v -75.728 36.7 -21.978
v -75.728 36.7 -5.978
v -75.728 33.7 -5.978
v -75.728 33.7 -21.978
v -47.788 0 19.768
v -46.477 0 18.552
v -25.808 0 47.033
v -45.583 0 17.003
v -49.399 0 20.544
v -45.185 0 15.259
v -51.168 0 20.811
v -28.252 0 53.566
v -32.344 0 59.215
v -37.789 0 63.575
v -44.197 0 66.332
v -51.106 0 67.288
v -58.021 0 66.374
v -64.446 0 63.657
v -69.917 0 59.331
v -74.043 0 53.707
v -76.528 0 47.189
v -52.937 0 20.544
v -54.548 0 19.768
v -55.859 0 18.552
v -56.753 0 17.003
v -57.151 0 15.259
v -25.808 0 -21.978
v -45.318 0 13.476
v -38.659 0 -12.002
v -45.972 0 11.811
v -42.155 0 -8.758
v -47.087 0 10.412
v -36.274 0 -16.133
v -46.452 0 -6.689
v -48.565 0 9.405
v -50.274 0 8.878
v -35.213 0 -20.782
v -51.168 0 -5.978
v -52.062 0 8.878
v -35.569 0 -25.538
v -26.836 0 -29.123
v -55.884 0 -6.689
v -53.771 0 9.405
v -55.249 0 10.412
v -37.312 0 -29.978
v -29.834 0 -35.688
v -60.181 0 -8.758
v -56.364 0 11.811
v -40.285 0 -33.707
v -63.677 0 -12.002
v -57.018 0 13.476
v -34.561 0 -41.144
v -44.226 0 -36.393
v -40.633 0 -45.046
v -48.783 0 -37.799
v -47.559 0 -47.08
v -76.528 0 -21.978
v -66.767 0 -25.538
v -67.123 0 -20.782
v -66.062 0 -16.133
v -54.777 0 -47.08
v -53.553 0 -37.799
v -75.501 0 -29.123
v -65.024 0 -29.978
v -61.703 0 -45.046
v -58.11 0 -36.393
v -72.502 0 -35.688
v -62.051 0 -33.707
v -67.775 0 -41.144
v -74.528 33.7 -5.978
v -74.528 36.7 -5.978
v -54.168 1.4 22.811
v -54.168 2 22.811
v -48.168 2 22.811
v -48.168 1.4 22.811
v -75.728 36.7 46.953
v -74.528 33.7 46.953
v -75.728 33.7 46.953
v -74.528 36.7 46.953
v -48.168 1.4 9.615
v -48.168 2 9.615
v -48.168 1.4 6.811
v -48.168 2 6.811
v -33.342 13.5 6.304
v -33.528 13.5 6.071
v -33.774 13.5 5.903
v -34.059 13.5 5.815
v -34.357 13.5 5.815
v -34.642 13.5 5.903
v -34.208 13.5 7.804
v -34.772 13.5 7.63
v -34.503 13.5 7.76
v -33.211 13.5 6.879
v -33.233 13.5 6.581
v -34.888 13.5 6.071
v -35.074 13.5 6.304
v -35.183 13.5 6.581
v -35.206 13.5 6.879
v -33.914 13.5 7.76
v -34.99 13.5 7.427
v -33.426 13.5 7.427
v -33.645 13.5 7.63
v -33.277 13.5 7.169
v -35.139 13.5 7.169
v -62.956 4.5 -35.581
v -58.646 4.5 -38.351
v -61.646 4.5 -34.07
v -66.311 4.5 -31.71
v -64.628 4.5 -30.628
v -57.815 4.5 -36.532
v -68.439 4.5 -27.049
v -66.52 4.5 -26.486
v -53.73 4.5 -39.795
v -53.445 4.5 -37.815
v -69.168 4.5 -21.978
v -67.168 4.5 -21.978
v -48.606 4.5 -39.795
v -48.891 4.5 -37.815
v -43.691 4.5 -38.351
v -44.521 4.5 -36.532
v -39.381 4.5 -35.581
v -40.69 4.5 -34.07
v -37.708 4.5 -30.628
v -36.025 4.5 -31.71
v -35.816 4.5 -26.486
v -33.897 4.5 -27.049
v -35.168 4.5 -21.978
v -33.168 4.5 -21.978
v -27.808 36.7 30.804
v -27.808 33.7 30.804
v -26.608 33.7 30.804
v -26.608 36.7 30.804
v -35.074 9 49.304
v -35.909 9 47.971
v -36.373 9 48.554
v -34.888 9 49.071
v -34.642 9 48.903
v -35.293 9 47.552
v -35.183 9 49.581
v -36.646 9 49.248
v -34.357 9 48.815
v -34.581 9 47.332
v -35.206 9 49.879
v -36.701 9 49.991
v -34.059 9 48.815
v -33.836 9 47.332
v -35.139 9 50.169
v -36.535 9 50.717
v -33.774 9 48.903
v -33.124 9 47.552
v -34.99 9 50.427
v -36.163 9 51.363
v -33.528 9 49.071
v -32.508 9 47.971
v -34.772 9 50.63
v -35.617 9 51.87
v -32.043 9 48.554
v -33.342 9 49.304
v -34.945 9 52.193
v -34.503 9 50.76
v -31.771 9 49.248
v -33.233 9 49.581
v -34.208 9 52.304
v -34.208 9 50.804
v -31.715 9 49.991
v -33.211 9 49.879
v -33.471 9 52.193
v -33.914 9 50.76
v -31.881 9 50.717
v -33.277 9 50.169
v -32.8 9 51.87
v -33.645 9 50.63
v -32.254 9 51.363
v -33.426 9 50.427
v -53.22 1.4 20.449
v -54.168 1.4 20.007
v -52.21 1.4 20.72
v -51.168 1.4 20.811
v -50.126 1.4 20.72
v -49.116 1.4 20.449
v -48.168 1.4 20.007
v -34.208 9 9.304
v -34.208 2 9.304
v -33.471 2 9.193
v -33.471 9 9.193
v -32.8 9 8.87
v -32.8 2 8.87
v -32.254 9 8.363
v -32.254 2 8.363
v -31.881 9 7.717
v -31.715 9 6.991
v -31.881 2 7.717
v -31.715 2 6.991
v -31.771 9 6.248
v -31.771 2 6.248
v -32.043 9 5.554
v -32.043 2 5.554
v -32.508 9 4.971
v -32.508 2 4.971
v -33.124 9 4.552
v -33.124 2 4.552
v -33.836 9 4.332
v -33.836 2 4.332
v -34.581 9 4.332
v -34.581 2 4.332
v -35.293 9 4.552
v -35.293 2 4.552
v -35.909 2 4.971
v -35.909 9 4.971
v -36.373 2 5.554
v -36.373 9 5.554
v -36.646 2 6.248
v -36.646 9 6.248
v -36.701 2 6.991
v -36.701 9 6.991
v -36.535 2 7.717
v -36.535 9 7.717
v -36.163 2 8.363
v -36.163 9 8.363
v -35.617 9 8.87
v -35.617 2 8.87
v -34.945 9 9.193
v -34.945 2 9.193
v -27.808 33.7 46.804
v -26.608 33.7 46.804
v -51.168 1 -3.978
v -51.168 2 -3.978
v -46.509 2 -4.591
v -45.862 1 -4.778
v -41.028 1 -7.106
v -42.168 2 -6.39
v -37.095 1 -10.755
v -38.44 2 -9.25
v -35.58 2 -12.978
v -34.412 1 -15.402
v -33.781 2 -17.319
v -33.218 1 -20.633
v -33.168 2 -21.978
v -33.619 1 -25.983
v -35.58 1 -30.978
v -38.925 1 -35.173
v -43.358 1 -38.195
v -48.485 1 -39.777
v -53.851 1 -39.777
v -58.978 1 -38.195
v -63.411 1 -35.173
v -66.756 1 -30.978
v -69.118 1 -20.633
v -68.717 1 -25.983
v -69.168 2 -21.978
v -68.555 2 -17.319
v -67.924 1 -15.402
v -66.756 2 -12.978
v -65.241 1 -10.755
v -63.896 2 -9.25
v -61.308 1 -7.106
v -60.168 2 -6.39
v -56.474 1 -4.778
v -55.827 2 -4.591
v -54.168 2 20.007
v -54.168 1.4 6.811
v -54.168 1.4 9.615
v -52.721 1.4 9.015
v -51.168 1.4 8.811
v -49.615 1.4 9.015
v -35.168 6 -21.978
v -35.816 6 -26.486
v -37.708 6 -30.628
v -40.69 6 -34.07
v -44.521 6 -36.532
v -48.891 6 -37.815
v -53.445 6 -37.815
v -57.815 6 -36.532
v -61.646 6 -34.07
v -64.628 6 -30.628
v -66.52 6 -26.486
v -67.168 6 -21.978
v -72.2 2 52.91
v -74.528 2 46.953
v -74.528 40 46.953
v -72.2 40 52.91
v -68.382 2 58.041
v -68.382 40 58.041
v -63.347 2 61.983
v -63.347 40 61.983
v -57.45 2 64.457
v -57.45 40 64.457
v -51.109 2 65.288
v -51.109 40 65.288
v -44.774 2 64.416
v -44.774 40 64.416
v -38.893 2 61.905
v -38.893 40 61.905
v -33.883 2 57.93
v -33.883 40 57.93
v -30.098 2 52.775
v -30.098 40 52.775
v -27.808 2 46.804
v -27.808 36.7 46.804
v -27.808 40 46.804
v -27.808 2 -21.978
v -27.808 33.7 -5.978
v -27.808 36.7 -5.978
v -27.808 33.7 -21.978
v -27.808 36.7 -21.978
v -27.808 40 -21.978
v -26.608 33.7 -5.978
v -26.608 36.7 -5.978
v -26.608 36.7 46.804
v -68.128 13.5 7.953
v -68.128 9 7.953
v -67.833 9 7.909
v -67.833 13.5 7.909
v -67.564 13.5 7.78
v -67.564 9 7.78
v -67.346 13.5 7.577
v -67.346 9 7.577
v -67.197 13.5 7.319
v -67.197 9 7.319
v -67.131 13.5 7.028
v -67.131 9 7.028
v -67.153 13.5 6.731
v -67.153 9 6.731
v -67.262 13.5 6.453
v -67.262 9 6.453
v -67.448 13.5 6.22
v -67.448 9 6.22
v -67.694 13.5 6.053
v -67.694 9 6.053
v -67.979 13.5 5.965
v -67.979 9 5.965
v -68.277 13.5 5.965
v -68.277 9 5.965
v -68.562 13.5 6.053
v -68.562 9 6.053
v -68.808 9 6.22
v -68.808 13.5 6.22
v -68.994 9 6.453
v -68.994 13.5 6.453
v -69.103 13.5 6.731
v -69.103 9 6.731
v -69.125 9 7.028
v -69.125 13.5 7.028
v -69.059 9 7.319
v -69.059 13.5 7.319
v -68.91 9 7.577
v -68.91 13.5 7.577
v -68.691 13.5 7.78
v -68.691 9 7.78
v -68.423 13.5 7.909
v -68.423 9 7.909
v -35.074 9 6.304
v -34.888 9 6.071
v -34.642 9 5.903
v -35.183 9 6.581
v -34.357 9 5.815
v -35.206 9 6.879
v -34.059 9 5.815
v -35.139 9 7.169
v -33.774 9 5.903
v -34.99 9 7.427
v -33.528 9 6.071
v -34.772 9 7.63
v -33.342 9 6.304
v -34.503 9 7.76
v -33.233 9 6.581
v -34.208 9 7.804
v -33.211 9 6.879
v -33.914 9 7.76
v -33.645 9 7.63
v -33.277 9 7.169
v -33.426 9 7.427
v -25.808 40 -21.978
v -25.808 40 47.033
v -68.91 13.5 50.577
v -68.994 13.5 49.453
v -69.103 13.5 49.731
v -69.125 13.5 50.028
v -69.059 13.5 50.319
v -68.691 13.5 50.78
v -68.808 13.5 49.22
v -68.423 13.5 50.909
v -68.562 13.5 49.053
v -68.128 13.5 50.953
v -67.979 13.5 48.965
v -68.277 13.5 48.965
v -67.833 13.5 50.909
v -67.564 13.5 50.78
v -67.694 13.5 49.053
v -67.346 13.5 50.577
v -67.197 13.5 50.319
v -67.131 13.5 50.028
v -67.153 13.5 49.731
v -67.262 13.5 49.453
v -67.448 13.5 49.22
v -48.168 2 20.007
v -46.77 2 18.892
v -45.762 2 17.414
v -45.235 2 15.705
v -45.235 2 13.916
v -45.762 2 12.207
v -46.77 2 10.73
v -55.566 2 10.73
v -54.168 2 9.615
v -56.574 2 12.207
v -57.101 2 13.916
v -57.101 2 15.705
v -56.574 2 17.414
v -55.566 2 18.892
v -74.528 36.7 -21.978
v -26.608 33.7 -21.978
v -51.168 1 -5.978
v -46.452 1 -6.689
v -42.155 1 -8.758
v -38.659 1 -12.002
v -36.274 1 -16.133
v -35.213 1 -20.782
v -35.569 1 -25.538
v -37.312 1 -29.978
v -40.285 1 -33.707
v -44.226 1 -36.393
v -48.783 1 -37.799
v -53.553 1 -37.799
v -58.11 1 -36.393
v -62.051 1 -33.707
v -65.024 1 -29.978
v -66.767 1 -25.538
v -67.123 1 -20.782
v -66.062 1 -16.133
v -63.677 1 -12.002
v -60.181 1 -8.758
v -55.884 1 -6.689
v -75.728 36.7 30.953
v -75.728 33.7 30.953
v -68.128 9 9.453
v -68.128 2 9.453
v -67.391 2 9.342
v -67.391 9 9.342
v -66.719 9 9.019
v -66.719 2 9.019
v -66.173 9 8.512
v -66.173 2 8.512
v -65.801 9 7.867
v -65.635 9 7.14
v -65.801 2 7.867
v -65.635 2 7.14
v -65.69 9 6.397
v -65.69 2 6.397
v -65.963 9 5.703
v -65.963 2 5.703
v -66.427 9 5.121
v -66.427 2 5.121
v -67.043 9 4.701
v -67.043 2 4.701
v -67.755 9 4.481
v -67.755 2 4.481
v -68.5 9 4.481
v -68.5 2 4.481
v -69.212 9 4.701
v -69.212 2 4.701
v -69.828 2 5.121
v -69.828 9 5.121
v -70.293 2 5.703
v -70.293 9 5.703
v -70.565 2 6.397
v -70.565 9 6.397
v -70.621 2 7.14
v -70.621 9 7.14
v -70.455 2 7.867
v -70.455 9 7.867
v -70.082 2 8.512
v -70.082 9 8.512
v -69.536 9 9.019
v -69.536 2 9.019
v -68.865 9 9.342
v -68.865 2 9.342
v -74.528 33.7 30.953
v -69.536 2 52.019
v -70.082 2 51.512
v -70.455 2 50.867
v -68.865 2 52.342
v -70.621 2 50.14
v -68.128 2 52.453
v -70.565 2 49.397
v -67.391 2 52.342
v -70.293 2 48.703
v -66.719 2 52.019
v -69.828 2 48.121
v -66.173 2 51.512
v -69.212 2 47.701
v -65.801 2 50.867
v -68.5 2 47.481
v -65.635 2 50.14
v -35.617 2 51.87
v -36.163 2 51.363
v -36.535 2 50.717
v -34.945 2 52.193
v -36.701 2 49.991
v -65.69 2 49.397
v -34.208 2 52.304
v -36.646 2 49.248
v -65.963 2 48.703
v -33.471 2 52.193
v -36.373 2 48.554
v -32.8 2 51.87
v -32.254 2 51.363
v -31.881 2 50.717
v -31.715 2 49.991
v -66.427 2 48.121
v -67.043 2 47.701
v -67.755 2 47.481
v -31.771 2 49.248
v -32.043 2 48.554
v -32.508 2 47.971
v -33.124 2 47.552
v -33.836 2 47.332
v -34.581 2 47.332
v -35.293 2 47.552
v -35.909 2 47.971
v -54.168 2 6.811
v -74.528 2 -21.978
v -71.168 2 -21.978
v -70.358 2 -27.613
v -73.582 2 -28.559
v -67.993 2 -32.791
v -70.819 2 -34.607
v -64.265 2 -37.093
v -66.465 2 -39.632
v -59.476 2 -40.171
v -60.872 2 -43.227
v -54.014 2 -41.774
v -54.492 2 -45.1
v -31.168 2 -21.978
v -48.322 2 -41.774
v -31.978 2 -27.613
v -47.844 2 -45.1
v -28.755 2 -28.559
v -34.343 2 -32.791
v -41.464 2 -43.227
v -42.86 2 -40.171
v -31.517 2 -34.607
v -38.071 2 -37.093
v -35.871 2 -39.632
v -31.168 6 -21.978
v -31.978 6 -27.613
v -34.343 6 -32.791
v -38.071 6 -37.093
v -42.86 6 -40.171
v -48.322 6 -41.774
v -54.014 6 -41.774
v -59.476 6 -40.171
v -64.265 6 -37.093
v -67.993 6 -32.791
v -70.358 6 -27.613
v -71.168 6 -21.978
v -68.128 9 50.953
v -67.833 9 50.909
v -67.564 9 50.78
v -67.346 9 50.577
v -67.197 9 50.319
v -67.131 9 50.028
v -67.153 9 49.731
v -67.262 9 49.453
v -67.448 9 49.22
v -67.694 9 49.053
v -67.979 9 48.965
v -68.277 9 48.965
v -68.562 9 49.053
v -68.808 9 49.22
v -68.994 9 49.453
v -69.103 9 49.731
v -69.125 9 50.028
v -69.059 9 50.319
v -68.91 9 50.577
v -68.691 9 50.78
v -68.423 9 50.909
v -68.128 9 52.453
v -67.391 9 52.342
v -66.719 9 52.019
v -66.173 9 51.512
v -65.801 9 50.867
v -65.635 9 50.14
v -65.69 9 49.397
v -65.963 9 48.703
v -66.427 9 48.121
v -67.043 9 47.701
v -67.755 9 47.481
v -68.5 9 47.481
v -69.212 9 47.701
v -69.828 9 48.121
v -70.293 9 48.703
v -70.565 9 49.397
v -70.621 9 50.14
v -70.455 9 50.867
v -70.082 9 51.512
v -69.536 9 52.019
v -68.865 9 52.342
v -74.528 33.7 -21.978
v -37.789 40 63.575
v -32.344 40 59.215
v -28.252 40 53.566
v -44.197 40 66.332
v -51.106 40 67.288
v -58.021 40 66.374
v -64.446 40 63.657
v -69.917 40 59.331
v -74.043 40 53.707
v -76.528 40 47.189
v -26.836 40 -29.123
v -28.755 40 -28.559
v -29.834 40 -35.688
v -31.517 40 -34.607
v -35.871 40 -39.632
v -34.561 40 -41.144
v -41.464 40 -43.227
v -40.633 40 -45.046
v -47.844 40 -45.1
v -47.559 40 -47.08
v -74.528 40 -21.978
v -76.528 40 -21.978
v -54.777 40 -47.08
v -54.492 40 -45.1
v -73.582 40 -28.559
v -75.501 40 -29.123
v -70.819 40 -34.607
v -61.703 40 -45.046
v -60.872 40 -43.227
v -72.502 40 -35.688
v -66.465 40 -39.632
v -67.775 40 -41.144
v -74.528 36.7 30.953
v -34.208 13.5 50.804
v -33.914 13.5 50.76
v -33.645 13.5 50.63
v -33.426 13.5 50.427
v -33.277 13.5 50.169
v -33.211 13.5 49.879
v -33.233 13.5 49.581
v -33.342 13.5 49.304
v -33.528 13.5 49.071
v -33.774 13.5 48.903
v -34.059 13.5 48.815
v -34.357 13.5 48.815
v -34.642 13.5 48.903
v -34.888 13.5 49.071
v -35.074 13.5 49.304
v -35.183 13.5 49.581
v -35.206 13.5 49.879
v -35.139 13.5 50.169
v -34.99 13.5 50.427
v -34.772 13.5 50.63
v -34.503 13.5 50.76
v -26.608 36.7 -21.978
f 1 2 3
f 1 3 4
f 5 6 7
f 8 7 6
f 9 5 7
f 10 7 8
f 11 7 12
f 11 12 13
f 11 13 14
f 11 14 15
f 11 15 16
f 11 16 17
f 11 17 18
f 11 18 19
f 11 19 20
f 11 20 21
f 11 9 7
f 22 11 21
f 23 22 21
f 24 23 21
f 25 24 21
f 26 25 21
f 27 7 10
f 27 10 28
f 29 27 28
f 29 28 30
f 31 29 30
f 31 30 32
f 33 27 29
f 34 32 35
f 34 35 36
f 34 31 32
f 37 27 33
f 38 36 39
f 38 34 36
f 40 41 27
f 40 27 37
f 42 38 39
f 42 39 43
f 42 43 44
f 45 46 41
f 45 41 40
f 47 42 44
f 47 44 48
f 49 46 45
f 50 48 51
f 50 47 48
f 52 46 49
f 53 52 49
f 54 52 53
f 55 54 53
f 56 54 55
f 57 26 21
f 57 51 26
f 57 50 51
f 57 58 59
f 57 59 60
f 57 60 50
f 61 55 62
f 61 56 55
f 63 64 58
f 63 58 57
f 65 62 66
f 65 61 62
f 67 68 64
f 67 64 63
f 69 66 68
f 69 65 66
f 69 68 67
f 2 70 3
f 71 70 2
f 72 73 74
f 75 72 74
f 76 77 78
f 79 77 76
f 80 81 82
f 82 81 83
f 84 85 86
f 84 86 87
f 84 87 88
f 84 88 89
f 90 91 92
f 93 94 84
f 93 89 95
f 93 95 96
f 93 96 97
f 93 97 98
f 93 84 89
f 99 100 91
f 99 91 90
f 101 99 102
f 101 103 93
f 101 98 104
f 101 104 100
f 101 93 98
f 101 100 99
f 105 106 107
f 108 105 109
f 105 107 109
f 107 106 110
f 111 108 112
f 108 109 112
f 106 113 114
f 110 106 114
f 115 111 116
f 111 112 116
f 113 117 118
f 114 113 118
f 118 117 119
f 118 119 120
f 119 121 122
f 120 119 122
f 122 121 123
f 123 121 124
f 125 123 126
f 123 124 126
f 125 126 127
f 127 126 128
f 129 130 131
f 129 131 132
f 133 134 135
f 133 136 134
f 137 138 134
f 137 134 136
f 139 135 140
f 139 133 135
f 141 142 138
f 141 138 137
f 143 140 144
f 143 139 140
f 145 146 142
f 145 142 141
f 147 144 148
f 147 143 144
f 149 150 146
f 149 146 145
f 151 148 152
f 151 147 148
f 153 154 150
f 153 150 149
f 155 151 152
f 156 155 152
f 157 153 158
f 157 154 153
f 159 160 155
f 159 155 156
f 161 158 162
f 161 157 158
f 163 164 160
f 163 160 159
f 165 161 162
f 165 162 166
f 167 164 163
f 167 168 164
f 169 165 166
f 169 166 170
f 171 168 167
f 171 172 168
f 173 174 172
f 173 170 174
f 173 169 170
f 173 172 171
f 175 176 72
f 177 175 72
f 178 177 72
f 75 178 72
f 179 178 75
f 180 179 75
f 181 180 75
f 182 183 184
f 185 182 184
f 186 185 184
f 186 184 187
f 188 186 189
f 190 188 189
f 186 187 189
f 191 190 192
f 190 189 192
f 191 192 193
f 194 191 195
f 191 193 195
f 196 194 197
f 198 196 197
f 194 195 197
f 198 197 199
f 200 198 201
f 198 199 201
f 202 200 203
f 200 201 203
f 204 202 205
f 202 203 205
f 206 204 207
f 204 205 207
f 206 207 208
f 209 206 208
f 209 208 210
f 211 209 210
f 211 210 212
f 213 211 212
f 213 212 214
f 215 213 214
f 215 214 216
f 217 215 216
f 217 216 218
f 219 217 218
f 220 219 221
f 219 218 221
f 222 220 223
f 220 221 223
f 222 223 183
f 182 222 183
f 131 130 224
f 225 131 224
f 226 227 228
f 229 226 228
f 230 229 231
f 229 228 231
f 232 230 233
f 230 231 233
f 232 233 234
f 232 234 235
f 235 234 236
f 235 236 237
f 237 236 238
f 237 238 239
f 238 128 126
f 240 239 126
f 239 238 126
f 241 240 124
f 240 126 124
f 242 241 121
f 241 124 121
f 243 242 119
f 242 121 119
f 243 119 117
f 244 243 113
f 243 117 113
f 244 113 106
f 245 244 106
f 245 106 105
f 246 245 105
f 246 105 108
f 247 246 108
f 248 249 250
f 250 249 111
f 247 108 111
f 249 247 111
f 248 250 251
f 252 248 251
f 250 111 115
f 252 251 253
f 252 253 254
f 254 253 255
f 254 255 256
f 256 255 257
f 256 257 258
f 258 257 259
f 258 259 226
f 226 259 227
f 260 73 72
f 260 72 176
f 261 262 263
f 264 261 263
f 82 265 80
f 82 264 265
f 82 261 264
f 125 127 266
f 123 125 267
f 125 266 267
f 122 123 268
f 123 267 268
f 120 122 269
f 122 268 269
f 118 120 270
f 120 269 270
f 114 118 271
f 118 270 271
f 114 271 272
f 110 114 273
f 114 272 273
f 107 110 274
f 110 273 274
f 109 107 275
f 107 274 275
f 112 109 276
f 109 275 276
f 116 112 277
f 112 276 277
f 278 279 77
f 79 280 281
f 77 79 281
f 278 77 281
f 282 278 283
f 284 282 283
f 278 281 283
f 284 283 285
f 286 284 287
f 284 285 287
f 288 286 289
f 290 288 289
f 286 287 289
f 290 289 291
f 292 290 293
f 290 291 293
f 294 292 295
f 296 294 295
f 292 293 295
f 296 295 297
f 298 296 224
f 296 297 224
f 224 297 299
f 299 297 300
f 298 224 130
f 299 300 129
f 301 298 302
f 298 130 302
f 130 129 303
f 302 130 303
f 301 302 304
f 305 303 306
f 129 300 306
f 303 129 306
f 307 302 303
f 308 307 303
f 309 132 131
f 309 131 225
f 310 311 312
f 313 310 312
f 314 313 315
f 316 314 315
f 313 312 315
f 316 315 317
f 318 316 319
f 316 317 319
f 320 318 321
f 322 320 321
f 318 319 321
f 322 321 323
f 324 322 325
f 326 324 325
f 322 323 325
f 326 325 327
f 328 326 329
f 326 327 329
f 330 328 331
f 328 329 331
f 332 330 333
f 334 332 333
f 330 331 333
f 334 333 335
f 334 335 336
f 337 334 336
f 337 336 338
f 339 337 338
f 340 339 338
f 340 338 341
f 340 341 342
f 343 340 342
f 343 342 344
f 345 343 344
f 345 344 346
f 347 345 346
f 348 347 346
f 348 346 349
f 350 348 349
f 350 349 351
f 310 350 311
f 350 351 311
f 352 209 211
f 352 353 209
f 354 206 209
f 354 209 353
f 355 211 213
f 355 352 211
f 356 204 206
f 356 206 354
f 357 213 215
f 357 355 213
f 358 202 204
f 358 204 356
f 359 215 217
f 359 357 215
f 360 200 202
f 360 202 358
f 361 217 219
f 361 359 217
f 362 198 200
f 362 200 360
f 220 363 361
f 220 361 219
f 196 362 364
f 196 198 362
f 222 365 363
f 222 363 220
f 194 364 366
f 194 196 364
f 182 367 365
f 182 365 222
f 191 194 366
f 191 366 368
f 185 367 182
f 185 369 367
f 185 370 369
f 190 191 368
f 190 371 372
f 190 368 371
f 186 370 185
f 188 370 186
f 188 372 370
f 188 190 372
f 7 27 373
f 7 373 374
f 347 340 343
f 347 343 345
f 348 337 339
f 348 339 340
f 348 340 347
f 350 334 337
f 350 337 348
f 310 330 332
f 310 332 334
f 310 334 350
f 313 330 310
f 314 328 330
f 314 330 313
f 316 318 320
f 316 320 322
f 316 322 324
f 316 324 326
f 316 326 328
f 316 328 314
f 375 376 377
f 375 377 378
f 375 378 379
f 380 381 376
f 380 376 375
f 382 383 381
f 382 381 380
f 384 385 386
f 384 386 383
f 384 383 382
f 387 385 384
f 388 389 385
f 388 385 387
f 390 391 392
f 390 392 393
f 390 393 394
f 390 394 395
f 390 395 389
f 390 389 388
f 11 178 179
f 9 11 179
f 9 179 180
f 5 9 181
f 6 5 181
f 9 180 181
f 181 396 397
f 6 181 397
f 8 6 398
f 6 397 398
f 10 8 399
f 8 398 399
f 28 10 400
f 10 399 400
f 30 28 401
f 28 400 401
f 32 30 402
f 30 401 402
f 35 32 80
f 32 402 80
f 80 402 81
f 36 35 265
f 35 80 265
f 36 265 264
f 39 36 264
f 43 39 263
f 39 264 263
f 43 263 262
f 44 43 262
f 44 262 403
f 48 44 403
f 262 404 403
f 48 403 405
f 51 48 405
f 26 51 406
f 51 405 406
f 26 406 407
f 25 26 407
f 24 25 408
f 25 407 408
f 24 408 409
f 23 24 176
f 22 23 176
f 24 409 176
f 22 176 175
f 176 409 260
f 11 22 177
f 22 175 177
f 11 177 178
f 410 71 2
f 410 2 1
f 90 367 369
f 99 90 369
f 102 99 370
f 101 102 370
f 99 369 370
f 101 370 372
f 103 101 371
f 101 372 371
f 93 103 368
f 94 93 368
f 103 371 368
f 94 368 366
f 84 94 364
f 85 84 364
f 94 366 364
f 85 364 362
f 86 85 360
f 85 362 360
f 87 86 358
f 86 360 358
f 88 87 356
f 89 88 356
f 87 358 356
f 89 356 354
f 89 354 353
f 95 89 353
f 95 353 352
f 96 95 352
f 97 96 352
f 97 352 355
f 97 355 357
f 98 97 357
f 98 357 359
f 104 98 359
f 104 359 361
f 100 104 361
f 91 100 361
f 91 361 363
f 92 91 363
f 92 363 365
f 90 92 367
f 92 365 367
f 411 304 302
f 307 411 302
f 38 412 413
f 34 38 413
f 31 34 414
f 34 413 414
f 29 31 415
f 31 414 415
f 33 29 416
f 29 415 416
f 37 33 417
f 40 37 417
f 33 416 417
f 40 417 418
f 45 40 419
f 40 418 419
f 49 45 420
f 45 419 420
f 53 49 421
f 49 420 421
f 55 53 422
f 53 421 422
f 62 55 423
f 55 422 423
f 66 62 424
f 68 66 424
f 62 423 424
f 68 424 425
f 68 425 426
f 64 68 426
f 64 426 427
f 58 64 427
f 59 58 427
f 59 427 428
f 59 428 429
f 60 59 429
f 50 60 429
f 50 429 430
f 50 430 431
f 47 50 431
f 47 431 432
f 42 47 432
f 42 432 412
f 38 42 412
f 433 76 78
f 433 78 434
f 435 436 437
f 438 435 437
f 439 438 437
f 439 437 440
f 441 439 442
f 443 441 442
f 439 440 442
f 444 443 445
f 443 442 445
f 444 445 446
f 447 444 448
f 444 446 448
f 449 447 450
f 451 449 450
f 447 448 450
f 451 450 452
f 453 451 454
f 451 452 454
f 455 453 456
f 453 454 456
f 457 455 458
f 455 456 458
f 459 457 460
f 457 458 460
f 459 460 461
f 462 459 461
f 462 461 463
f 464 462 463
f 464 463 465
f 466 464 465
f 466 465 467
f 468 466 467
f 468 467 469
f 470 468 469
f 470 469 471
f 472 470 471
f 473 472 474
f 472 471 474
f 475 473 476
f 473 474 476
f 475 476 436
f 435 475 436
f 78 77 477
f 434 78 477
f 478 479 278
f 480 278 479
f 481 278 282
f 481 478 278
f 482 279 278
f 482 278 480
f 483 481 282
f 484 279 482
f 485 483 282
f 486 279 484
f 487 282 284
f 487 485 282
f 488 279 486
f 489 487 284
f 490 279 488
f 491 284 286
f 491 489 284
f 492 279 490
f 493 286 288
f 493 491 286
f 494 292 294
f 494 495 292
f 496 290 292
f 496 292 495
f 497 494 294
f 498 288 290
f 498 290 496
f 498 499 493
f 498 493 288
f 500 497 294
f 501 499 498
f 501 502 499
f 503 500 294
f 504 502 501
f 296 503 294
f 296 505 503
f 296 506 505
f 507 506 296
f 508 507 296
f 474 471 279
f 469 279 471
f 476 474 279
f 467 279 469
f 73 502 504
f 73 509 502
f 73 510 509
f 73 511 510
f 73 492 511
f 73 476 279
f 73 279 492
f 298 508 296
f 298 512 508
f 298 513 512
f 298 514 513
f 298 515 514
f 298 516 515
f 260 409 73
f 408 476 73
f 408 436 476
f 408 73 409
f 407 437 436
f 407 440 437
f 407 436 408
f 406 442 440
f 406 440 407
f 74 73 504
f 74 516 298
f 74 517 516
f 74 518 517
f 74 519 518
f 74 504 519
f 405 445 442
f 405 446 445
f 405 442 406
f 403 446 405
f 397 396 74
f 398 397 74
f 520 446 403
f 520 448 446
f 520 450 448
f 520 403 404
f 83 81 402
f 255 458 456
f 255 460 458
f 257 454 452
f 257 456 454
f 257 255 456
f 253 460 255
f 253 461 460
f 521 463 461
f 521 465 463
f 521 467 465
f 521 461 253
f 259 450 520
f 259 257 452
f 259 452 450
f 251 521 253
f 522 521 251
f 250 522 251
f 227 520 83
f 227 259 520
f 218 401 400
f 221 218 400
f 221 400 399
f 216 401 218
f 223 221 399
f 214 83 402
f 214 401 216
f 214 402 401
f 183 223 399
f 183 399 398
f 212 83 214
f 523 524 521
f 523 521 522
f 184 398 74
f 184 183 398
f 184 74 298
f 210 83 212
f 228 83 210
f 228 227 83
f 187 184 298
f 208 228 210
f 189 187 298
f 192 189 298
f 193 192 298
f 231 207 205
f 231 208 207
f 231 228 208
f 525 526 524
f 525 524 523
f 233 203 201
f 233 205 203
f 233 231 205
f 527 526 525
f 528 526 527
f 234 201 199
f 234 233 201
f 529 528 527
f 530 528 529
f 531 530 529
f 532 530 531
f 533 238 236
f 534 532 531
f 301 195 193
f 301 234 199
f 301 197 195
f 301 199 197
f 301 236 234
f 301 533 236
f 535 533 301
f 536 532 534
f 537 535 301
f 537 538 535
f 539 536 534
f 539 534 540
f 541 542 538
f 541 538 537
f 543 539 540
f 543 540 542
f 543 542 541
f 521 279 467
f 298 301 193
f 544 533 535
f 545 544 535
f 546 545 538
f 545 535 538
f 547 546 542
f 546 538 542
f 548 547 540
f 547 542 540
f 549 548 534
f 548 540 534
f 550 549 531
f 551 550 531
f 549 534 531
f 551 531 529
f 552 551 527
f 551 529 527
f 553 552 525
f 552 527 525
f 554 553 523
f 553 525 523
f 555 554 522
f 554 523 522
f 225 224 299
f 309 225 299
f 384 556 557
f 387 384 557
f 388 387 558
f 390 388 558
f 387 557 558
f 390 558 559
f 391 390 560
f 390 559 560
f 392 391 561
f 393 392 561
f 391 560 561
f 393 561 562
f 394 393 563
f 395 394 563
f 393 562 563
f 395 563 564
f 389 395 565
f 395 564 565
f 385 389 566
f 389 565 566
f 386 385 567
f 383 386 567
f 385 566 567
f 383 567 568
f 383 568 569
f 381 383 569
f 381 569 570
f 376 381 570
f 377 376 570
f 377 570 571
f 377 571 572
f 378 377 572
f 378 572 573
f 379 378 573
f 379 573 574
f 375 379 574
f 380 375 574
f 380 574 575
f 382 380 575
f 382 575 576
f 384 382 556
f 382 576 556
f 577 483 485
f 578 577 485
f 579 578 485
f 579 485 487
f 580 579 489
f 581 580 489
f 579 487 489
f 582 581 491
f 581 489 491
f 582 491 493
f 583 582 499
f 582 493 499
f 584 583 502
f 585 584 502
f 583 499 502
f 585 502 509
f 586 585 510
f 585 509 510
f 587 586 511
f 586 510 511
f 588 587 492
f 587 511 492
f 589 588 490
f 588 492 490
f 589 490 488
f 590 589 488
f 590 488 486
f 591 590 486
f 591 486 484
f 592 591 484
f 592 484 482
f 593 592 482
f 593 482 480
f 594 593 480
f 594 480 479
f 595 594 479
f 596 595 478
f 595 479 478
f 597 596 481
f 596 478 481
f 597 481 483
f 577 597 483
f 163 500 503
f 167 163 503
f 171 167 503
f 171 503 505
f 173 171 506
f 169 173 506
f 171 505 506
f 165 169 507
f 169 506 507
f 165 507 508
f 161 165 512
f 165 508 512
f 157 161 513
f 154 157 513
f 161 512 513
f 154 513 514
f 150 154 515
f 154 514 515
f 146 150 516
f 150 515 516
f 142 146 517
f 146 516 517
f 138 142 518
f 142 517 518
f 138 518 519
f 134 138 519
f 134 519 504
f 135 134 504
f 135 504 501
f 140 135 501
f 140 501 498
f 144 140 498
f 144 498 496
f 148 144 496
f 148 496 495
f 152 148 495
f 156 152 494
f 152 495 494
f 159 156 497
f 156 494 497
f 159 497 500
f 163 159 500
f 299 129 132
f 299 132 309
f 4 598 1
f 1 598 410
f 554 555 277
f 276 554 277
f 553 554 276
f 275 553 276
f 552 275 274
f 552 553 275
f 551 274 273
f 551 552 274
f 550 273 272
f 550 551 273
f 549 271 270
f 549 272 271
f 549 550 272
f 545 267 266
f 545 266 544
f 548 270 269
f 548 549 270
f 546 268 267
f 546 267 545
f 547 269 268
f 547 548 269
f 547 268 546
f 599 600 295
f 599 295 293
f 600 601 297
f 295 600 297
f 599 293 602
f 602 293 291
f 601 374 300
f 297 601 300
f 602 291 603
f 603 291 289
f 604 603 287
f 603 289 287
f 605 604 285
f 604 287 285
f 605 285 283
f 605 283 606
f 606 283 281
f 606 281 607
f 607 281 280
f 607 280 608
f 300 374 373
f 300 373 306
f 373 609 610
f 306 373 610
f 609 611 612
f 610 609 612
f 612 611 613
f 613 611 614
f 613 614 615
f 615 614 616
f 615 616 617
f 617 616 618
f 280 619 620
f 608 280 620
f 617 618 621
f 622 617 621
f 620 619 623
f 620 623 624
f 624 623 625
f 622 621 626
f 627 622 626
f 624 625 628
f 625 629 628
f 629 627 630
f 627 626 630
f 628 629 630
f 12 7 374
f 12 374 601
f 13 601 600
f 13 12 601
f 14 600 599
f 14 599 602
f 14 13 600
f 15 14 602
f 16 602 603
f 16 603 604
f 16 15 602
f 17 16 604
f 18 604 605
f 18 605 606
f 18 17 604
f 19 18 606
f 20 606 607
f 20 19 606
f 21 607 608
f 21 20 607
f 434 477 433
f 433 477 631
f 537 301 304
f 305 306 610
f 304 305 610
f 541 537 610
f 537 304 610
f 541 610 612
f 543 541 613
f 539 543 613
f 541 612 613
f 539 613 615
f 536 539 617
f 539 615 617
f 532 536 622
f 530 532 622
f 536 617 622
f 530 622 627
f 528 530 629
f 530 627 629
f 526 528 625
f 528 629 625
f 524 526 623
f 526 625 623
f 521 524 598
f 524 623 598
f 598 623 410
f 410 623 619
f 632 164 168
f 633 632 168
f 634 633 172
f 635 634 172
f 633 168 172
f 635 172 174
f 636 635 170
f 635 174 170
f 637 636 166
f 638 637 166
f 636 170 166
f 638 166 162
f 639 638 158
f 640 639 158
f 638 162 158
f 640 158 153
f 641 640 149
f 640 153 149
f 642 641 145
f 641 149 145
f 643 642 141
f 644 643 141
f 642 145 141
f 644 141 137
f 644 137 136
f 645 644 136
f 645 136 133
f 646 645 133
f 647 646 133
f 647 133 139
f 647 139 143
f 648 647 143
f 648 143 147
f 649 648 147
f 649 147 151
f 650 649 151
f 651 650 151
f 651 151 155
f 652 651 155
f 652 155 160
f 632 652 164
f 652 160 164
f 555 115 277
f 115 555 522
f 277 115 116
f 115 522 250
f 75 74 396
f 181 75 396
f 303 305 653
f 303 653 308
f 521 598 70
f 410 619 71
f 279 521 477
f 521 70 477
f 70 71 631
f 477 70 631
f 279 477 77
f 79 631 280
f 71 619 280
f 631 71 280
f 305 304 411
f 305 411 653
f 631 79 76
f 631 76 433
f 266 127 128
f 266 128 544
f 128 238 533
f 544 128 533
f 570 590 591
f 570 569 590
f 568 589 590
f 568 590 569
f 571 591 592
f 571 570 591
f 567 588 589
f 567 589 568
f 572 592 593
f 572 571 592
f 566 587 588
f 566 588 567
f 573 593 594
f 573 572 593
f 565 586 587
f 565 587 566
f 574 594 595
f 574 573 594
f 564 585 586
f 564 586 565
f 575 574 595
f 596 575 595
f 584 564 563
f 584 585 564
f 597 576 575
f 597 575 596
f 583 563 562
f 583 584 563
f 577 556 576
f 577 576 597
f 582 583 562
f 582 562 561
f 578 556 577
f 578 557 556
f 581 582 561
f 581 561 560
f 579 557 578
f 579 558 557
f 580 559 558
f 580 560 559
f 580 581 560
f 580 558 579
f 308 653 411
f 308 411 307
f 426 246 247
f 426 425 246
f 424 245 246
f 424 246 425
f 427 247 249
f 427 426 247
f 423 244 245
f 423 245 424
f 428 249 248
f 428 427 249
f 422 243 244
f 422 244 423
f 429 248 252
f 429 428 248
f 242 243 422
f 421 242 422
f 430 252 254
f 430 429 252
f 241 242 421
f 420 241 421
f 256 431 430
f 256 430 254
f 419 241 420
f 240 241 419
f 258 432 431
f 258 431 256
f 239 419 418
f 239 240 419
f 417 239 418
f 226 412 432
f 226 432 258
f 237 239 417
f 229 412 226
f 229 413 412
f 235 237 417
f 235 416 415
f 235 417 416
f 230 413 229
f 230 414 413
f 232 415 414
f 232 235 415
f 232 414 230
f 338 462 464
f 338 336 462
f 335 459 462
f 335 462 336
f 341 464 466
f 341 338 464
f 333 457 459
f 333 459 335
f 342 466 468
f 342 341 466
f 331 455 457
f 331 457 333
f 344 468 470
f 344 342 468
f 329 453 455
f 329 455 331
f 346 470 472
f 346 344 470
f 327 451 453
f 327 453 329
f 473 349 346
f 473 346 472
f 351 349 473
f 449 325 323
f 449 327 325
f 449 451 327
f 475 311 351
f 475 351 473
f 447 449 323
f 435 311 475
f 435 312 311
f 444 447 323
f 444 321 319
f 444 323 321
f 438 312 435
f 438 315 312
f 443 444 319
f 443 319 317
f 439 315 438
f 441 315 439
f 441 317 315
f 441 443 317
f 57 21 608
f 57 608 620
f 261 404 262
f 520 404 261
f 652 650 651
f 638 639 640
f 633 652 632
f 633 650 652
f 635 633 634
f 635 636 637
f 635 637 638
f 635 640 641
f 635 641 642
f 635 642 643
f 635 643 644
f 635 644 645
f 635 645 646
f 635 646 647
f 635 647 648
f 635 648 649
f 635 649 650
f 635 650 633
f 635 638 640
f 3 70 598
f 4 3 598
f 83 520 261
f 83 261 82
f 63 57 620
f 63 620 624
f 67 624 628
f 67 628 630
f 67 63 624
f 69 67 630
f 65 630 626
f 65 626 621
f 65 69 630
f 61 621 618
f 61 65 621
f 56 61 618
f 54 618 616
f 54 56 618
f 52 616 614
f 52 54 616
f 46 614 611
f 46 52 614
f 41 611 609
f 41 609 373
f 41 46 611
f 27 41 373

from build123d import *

# Parameters (mm, degrees)
SALIENTE_EXTRUIR5_DEPTH  = 40
CORTAR_EXTRUIR3_DEPTH    = 38
CROQUIS19_R              = 16
CORTAR_EXTRUIR4_DEPTH    = 16
CROQUIS22_R              = 6
CORTAR_EXTRUIR6_DEPTH    = 16
CROQUIS25_W              = 6
CROQUIS25_H              = 16
CORTAR_EXTRUIR10_DEPTH   = 0.6
CROQUIS28_R              = 18
CORTAR_EXTRUIR11_DEPTH   = 1
SALIENTE_EXTRUIR7_DEPTH  = 4
CROQUIS30_R              = 16
CORTAR_EXTRUIR12_DEPTH   = 34
CORTAR_EXTRUIR13_START   = 3.5
CROQUIS31_R              = 18
CORTAR_EXTRUIR13_DEPTH   = 3.5
CROQUIS24_W              = 16
CROQUIS24_H              = 3
CORTAR_EXTRUIR14_DEPTH   = 1.2
CROQUIS23_W              = 16
CROQUIS23_H              = 3
CORTAR_EXTRUIR15_DEPTH   = 1.2
CROQUIS32_R              = 2.5
SALIENTE_EXTRUIR8_DEPTH  = 7
CROQUIS49_R              = 1
SALIENTE_EXTRUIR9_DEPTH  = 4.5
CROQUIS47_R              = 1
SALIENTE_EXTRUIR10_DEPTH = 4.5
CROQUIS48_R              = 1
SALIENTE_EXTRUIR11_DEPTH = 4.5
CROQUIS50_R              = 1
SALIENTE_EXTRUIR12_DEPTH = 4.5


with BuildPart() as part:
    # Croquis1 → Saliente-Extruir5 (new body)
    with BuildSketch(Plane(origin=(0, 0, 0), x_dir=(1, 0, 0), z_dir=(0, 1, 0))):
        with BuildLine():
            Line((-76.52774776, -47.188914739), (-76.52774776, 21.977990865))
            ThreePointArc((-76.52774776, 21.977990865), (-51.168030611, 47.337708015), (-25.808313462, 21.977990865))
            Line((-25.808313462, 21.977990865), (-25.808313462, -47.033075243))
            ThreePointArc((-25.808313462, -47.033075243), (-51.106035712, -67.287819919), (-76.52774776, -47.188914739))
        make_face()
    extrude(amount=SALIENTE_EXTRUIR5_DEPTH)

    # Croquis16 → Cortar-Extruir3 (cut)
    with BuildSketch(Plane(origin=(0, 40, 0), x_dir=(1, 0, 0), z_dir=(0, 1, 0))):
        with BuildLine():
            Line((-74.52774776, 21.977990865), (-74.52774776, -46.95348914))
            ThreePointArc((-74.52774776, -46.95348914), (-51.109128236, -65.287819786), (-27.808313462, -46.804003852))
            Line((-27.808313462, -46.804003852), (-27.808313462, 21.977990865))
            ThreePointArc((-27.808313462, 21.977990865), (-51.168030611, 45.337708015), (-74.52774776, 21.977990865))
        make_face()
    extrude(amount=-CORTAR_EXTRUIR3_DEPTH, mode=Mode.SUBTRACT)

    # Croquis19 → Cortar-Extruir4 (cut)
    with BuildSketch(Plane(origin=(0, 2, 0), x_dir=(1, 0, 0), z_dir=(0, 1, 0))):
        with Locations(Location((-51.168030611, 21.977990865, 0), (0, 0, 270))):
            Circle(CROQUIS19_R)
    extrude(amount=-CORTAR_EXTRUIR4_DEPTH, mode=Mode.SUBTRACT)

    # Croquis22 → Cortar-Extruir6 (cut)
    with BuildSketch(Plane(origin=(0, 2, 0), x_dir=(1, 0, 0), z_dir=(0, 1, 0))):
        with Locations(Location((-51.168030611, -14.810665764, 0), (0, 0, 270))):
            Circle(CROQUIS22_R)
    extrude(amount=-CORTAR_EXTRUIR6_DEPTH, mode=Mode.SUBTRACT)

    # Croquis25 → Cortar-Extruir10 (cut)
    with BuildSketch(Plane(origin=(0, 2, 0), x_dir=(1, 0, 0), z_dir=(0, 1, 0))):
        with Locations((-51.168030611, -14.810665764)):
            Rectangle(CROQUIS25_W, CROQUIS25_H)
    extrude(amount=-CORTAR_EXTRUIR10_DEPTH, mode=Mode.SUBTRACT)

    # Croquis28 → Cortar-Extruir11 (cut)
    with BuildSketch(Plane(origin=(0, 2, 0), x_dir=(1, 0, 0), z_dir=(0, 1, 0))):
        with Locations(Location((-51.168030611, 21.977990865, 0), (0, 0, 270))):
            Circle(CROQUIS28_R)
    extrude(amount=-CORTAR_EXTRUIR11_DEPTH, mode=Mode.SUBTRACT)

    # Croquis29 → Saliente-Extruir7 (add)
    with BuildSketch(Plane(origin=(0, 2, 0), x_dir=(1, 0, 0), z_dir=(0, 1, 0))):
        with BuildLine():
            Line((-71.168030611, 21.977990865), (-31.168030611, 21.977990865))
            ThreePointArc((-31.168030611, 21.977990865), (-51.168030611, 41.977990865), (-71.168030611, 21.977990865))
        make_face()
    extrude(amount=SALIENTE_EXTRUIR7_DEPTH)

    # Croquis30 → Cortar-Extruir12 (cut)
    with BuildSketch(Plane(origin=(0, 6, 0), x_dir=(1, 0, 0), z_dir=(0, 1, 0))):
        with Locations(Location((-51.168030611, 21.977990865, 0), (0, 0, 270))):
            Circle(CROQUIS30_R)
    extrude(amount=-CORTAR_EXTRUIR12_DEPTH, mode=Mode.SUBTRACT)

    # Croquis31 → Cortar-Extruir13 (cut)
    with BuildSketch(Plane(origin=(0, 1, 0), x_dir=(1, 0, 0), z_dir=(0, 1, 0)).offset(CORTAR_EXTRUIR13_START)):
        with Locations(Location((-51.168030611, 21.977990865, 0), (0, 0, 270))):
            Circle(CROQUIS31_R)
    extrude(amount=-CORTAR_EXTRUIR13_DEPTH, mode=Mode.SUBTRACT)

    # Croquis24 → Cortar-Extruir14 (cut)
    with BuildSketch(Plane.ZY.offset(27.808313462)):
        with Locations((-13.977990865, 35.2)):
            Rectangle(CROQUIS24_W, CROQUIS24_H)
        with Locations((38.804003852, 35.2)):
            Rectangle(CROQUIS24_W, CROQUIS24_H)
    extrude(amount=-CORTAR_EXTRUIR14_DEPTH, mode=Mode.SUBTRACT)

    # Croquis23 → Cortar-Extruir15 (cut)
    with BuildSketch(Plane(origin=(-74.52774776, 0, 0), x_dir=(0, 0, -1), z_dir=(1, 0, 0))):
        with Locations((-38.95348914, 35.2)):
            Rectangle(CROQUIS23_W, CROQUIS23_H)
        with Locations((13.977990865, 35.2)):
            Rectangle(CROQUIS23_W, CROQUIS23_H)
    extrude(amount=-CORTAR_EXTRUIR15_DEPTH, mode=Mode.SUBTRACT)

    # Croquis32 → Saliente-Extruir8 (add)
    with BuildSketch(Plane(origin=(0, 2, 0), x_dir=(1, 0, 0), z_dir=(0, 1, 0))):
        with Locations(Location((-68.12774776, -49.95348914, 0), (0, 0, 270))):
            Circle(CROQUIS32_R)
        with Locations(Location((-34.208313462, -49.804003852, 0), (0, 0, 270))):
            Circle(CROQUIS32_R)
        with Locations(Location((-68.12774776, -6.95348914, 0), (0, 0, 270))):
            Circle(CROQUIS32_R)
        with Locations(Location((-34.208313462, -6.804003852, 0), (0, 0, 270))):
            Circle(CROQUIS32_R)
    extrude(amount=SALIENTE_EXTRUIR8_DEPTH)

    # Croquis49 → Saliente-Extruir9 (add)
    with BuildSketch(Plane(origin=(0, 9, 0), x_dir=(1, 0, 0), z_dir=(0, 1, 0))):
        with Locations(Location((-34.208313462, -49.804003852, 0), (0, 0, 270))):
            Circle(CROQUIS49_R)
    extrude(amount=SALIENTE_EXTRUIR9_DEPTH)

    # Croquis47 → Saliente-Extruir10 (add)
    with BuildSketch(Plane(origin=(0, 9, 0), x_dir=(1, 0, 0), z_dir=(0, 1, 0))):
        with Locations(Location((-34.208313462, -6.804003852, 0), (0, 0, 270))):
            Circle(CROQUIS47_R)
    extrude(amount=SALIENTE_EXTRUIR10_DEPTH)

    # Croquis48 → Saliente-Extruir11 (add)
    with BuildSketch(Plane(origin=(0, 9, 0), x_dir=(1, 0, 0), z_dir=(0, 1, 0))):
        with Locations(Location((-68.12774776, -6.95348914, 0), (0, 0, 270))):
            Circle(CROQUIS48_R)
    extrude(amount=SALIENTE_EXTRUIR11_DEPTH)

    # Croquis50 → Saliente-Extruir12 (add)
    with BuildSketch(Plane(origin=(0, 9, 0), x_dir=(1, 0, 0), z_dir=(0, 1, 0))):
        with Locations(Location((-68.12774776, -49.95348914, 0), (0, 0, 270))):
            Circle(CROQUIS50_R)
    extrude(amount=SALIENTE_EXTRUIR12_DEPTH)


solid = part.part
